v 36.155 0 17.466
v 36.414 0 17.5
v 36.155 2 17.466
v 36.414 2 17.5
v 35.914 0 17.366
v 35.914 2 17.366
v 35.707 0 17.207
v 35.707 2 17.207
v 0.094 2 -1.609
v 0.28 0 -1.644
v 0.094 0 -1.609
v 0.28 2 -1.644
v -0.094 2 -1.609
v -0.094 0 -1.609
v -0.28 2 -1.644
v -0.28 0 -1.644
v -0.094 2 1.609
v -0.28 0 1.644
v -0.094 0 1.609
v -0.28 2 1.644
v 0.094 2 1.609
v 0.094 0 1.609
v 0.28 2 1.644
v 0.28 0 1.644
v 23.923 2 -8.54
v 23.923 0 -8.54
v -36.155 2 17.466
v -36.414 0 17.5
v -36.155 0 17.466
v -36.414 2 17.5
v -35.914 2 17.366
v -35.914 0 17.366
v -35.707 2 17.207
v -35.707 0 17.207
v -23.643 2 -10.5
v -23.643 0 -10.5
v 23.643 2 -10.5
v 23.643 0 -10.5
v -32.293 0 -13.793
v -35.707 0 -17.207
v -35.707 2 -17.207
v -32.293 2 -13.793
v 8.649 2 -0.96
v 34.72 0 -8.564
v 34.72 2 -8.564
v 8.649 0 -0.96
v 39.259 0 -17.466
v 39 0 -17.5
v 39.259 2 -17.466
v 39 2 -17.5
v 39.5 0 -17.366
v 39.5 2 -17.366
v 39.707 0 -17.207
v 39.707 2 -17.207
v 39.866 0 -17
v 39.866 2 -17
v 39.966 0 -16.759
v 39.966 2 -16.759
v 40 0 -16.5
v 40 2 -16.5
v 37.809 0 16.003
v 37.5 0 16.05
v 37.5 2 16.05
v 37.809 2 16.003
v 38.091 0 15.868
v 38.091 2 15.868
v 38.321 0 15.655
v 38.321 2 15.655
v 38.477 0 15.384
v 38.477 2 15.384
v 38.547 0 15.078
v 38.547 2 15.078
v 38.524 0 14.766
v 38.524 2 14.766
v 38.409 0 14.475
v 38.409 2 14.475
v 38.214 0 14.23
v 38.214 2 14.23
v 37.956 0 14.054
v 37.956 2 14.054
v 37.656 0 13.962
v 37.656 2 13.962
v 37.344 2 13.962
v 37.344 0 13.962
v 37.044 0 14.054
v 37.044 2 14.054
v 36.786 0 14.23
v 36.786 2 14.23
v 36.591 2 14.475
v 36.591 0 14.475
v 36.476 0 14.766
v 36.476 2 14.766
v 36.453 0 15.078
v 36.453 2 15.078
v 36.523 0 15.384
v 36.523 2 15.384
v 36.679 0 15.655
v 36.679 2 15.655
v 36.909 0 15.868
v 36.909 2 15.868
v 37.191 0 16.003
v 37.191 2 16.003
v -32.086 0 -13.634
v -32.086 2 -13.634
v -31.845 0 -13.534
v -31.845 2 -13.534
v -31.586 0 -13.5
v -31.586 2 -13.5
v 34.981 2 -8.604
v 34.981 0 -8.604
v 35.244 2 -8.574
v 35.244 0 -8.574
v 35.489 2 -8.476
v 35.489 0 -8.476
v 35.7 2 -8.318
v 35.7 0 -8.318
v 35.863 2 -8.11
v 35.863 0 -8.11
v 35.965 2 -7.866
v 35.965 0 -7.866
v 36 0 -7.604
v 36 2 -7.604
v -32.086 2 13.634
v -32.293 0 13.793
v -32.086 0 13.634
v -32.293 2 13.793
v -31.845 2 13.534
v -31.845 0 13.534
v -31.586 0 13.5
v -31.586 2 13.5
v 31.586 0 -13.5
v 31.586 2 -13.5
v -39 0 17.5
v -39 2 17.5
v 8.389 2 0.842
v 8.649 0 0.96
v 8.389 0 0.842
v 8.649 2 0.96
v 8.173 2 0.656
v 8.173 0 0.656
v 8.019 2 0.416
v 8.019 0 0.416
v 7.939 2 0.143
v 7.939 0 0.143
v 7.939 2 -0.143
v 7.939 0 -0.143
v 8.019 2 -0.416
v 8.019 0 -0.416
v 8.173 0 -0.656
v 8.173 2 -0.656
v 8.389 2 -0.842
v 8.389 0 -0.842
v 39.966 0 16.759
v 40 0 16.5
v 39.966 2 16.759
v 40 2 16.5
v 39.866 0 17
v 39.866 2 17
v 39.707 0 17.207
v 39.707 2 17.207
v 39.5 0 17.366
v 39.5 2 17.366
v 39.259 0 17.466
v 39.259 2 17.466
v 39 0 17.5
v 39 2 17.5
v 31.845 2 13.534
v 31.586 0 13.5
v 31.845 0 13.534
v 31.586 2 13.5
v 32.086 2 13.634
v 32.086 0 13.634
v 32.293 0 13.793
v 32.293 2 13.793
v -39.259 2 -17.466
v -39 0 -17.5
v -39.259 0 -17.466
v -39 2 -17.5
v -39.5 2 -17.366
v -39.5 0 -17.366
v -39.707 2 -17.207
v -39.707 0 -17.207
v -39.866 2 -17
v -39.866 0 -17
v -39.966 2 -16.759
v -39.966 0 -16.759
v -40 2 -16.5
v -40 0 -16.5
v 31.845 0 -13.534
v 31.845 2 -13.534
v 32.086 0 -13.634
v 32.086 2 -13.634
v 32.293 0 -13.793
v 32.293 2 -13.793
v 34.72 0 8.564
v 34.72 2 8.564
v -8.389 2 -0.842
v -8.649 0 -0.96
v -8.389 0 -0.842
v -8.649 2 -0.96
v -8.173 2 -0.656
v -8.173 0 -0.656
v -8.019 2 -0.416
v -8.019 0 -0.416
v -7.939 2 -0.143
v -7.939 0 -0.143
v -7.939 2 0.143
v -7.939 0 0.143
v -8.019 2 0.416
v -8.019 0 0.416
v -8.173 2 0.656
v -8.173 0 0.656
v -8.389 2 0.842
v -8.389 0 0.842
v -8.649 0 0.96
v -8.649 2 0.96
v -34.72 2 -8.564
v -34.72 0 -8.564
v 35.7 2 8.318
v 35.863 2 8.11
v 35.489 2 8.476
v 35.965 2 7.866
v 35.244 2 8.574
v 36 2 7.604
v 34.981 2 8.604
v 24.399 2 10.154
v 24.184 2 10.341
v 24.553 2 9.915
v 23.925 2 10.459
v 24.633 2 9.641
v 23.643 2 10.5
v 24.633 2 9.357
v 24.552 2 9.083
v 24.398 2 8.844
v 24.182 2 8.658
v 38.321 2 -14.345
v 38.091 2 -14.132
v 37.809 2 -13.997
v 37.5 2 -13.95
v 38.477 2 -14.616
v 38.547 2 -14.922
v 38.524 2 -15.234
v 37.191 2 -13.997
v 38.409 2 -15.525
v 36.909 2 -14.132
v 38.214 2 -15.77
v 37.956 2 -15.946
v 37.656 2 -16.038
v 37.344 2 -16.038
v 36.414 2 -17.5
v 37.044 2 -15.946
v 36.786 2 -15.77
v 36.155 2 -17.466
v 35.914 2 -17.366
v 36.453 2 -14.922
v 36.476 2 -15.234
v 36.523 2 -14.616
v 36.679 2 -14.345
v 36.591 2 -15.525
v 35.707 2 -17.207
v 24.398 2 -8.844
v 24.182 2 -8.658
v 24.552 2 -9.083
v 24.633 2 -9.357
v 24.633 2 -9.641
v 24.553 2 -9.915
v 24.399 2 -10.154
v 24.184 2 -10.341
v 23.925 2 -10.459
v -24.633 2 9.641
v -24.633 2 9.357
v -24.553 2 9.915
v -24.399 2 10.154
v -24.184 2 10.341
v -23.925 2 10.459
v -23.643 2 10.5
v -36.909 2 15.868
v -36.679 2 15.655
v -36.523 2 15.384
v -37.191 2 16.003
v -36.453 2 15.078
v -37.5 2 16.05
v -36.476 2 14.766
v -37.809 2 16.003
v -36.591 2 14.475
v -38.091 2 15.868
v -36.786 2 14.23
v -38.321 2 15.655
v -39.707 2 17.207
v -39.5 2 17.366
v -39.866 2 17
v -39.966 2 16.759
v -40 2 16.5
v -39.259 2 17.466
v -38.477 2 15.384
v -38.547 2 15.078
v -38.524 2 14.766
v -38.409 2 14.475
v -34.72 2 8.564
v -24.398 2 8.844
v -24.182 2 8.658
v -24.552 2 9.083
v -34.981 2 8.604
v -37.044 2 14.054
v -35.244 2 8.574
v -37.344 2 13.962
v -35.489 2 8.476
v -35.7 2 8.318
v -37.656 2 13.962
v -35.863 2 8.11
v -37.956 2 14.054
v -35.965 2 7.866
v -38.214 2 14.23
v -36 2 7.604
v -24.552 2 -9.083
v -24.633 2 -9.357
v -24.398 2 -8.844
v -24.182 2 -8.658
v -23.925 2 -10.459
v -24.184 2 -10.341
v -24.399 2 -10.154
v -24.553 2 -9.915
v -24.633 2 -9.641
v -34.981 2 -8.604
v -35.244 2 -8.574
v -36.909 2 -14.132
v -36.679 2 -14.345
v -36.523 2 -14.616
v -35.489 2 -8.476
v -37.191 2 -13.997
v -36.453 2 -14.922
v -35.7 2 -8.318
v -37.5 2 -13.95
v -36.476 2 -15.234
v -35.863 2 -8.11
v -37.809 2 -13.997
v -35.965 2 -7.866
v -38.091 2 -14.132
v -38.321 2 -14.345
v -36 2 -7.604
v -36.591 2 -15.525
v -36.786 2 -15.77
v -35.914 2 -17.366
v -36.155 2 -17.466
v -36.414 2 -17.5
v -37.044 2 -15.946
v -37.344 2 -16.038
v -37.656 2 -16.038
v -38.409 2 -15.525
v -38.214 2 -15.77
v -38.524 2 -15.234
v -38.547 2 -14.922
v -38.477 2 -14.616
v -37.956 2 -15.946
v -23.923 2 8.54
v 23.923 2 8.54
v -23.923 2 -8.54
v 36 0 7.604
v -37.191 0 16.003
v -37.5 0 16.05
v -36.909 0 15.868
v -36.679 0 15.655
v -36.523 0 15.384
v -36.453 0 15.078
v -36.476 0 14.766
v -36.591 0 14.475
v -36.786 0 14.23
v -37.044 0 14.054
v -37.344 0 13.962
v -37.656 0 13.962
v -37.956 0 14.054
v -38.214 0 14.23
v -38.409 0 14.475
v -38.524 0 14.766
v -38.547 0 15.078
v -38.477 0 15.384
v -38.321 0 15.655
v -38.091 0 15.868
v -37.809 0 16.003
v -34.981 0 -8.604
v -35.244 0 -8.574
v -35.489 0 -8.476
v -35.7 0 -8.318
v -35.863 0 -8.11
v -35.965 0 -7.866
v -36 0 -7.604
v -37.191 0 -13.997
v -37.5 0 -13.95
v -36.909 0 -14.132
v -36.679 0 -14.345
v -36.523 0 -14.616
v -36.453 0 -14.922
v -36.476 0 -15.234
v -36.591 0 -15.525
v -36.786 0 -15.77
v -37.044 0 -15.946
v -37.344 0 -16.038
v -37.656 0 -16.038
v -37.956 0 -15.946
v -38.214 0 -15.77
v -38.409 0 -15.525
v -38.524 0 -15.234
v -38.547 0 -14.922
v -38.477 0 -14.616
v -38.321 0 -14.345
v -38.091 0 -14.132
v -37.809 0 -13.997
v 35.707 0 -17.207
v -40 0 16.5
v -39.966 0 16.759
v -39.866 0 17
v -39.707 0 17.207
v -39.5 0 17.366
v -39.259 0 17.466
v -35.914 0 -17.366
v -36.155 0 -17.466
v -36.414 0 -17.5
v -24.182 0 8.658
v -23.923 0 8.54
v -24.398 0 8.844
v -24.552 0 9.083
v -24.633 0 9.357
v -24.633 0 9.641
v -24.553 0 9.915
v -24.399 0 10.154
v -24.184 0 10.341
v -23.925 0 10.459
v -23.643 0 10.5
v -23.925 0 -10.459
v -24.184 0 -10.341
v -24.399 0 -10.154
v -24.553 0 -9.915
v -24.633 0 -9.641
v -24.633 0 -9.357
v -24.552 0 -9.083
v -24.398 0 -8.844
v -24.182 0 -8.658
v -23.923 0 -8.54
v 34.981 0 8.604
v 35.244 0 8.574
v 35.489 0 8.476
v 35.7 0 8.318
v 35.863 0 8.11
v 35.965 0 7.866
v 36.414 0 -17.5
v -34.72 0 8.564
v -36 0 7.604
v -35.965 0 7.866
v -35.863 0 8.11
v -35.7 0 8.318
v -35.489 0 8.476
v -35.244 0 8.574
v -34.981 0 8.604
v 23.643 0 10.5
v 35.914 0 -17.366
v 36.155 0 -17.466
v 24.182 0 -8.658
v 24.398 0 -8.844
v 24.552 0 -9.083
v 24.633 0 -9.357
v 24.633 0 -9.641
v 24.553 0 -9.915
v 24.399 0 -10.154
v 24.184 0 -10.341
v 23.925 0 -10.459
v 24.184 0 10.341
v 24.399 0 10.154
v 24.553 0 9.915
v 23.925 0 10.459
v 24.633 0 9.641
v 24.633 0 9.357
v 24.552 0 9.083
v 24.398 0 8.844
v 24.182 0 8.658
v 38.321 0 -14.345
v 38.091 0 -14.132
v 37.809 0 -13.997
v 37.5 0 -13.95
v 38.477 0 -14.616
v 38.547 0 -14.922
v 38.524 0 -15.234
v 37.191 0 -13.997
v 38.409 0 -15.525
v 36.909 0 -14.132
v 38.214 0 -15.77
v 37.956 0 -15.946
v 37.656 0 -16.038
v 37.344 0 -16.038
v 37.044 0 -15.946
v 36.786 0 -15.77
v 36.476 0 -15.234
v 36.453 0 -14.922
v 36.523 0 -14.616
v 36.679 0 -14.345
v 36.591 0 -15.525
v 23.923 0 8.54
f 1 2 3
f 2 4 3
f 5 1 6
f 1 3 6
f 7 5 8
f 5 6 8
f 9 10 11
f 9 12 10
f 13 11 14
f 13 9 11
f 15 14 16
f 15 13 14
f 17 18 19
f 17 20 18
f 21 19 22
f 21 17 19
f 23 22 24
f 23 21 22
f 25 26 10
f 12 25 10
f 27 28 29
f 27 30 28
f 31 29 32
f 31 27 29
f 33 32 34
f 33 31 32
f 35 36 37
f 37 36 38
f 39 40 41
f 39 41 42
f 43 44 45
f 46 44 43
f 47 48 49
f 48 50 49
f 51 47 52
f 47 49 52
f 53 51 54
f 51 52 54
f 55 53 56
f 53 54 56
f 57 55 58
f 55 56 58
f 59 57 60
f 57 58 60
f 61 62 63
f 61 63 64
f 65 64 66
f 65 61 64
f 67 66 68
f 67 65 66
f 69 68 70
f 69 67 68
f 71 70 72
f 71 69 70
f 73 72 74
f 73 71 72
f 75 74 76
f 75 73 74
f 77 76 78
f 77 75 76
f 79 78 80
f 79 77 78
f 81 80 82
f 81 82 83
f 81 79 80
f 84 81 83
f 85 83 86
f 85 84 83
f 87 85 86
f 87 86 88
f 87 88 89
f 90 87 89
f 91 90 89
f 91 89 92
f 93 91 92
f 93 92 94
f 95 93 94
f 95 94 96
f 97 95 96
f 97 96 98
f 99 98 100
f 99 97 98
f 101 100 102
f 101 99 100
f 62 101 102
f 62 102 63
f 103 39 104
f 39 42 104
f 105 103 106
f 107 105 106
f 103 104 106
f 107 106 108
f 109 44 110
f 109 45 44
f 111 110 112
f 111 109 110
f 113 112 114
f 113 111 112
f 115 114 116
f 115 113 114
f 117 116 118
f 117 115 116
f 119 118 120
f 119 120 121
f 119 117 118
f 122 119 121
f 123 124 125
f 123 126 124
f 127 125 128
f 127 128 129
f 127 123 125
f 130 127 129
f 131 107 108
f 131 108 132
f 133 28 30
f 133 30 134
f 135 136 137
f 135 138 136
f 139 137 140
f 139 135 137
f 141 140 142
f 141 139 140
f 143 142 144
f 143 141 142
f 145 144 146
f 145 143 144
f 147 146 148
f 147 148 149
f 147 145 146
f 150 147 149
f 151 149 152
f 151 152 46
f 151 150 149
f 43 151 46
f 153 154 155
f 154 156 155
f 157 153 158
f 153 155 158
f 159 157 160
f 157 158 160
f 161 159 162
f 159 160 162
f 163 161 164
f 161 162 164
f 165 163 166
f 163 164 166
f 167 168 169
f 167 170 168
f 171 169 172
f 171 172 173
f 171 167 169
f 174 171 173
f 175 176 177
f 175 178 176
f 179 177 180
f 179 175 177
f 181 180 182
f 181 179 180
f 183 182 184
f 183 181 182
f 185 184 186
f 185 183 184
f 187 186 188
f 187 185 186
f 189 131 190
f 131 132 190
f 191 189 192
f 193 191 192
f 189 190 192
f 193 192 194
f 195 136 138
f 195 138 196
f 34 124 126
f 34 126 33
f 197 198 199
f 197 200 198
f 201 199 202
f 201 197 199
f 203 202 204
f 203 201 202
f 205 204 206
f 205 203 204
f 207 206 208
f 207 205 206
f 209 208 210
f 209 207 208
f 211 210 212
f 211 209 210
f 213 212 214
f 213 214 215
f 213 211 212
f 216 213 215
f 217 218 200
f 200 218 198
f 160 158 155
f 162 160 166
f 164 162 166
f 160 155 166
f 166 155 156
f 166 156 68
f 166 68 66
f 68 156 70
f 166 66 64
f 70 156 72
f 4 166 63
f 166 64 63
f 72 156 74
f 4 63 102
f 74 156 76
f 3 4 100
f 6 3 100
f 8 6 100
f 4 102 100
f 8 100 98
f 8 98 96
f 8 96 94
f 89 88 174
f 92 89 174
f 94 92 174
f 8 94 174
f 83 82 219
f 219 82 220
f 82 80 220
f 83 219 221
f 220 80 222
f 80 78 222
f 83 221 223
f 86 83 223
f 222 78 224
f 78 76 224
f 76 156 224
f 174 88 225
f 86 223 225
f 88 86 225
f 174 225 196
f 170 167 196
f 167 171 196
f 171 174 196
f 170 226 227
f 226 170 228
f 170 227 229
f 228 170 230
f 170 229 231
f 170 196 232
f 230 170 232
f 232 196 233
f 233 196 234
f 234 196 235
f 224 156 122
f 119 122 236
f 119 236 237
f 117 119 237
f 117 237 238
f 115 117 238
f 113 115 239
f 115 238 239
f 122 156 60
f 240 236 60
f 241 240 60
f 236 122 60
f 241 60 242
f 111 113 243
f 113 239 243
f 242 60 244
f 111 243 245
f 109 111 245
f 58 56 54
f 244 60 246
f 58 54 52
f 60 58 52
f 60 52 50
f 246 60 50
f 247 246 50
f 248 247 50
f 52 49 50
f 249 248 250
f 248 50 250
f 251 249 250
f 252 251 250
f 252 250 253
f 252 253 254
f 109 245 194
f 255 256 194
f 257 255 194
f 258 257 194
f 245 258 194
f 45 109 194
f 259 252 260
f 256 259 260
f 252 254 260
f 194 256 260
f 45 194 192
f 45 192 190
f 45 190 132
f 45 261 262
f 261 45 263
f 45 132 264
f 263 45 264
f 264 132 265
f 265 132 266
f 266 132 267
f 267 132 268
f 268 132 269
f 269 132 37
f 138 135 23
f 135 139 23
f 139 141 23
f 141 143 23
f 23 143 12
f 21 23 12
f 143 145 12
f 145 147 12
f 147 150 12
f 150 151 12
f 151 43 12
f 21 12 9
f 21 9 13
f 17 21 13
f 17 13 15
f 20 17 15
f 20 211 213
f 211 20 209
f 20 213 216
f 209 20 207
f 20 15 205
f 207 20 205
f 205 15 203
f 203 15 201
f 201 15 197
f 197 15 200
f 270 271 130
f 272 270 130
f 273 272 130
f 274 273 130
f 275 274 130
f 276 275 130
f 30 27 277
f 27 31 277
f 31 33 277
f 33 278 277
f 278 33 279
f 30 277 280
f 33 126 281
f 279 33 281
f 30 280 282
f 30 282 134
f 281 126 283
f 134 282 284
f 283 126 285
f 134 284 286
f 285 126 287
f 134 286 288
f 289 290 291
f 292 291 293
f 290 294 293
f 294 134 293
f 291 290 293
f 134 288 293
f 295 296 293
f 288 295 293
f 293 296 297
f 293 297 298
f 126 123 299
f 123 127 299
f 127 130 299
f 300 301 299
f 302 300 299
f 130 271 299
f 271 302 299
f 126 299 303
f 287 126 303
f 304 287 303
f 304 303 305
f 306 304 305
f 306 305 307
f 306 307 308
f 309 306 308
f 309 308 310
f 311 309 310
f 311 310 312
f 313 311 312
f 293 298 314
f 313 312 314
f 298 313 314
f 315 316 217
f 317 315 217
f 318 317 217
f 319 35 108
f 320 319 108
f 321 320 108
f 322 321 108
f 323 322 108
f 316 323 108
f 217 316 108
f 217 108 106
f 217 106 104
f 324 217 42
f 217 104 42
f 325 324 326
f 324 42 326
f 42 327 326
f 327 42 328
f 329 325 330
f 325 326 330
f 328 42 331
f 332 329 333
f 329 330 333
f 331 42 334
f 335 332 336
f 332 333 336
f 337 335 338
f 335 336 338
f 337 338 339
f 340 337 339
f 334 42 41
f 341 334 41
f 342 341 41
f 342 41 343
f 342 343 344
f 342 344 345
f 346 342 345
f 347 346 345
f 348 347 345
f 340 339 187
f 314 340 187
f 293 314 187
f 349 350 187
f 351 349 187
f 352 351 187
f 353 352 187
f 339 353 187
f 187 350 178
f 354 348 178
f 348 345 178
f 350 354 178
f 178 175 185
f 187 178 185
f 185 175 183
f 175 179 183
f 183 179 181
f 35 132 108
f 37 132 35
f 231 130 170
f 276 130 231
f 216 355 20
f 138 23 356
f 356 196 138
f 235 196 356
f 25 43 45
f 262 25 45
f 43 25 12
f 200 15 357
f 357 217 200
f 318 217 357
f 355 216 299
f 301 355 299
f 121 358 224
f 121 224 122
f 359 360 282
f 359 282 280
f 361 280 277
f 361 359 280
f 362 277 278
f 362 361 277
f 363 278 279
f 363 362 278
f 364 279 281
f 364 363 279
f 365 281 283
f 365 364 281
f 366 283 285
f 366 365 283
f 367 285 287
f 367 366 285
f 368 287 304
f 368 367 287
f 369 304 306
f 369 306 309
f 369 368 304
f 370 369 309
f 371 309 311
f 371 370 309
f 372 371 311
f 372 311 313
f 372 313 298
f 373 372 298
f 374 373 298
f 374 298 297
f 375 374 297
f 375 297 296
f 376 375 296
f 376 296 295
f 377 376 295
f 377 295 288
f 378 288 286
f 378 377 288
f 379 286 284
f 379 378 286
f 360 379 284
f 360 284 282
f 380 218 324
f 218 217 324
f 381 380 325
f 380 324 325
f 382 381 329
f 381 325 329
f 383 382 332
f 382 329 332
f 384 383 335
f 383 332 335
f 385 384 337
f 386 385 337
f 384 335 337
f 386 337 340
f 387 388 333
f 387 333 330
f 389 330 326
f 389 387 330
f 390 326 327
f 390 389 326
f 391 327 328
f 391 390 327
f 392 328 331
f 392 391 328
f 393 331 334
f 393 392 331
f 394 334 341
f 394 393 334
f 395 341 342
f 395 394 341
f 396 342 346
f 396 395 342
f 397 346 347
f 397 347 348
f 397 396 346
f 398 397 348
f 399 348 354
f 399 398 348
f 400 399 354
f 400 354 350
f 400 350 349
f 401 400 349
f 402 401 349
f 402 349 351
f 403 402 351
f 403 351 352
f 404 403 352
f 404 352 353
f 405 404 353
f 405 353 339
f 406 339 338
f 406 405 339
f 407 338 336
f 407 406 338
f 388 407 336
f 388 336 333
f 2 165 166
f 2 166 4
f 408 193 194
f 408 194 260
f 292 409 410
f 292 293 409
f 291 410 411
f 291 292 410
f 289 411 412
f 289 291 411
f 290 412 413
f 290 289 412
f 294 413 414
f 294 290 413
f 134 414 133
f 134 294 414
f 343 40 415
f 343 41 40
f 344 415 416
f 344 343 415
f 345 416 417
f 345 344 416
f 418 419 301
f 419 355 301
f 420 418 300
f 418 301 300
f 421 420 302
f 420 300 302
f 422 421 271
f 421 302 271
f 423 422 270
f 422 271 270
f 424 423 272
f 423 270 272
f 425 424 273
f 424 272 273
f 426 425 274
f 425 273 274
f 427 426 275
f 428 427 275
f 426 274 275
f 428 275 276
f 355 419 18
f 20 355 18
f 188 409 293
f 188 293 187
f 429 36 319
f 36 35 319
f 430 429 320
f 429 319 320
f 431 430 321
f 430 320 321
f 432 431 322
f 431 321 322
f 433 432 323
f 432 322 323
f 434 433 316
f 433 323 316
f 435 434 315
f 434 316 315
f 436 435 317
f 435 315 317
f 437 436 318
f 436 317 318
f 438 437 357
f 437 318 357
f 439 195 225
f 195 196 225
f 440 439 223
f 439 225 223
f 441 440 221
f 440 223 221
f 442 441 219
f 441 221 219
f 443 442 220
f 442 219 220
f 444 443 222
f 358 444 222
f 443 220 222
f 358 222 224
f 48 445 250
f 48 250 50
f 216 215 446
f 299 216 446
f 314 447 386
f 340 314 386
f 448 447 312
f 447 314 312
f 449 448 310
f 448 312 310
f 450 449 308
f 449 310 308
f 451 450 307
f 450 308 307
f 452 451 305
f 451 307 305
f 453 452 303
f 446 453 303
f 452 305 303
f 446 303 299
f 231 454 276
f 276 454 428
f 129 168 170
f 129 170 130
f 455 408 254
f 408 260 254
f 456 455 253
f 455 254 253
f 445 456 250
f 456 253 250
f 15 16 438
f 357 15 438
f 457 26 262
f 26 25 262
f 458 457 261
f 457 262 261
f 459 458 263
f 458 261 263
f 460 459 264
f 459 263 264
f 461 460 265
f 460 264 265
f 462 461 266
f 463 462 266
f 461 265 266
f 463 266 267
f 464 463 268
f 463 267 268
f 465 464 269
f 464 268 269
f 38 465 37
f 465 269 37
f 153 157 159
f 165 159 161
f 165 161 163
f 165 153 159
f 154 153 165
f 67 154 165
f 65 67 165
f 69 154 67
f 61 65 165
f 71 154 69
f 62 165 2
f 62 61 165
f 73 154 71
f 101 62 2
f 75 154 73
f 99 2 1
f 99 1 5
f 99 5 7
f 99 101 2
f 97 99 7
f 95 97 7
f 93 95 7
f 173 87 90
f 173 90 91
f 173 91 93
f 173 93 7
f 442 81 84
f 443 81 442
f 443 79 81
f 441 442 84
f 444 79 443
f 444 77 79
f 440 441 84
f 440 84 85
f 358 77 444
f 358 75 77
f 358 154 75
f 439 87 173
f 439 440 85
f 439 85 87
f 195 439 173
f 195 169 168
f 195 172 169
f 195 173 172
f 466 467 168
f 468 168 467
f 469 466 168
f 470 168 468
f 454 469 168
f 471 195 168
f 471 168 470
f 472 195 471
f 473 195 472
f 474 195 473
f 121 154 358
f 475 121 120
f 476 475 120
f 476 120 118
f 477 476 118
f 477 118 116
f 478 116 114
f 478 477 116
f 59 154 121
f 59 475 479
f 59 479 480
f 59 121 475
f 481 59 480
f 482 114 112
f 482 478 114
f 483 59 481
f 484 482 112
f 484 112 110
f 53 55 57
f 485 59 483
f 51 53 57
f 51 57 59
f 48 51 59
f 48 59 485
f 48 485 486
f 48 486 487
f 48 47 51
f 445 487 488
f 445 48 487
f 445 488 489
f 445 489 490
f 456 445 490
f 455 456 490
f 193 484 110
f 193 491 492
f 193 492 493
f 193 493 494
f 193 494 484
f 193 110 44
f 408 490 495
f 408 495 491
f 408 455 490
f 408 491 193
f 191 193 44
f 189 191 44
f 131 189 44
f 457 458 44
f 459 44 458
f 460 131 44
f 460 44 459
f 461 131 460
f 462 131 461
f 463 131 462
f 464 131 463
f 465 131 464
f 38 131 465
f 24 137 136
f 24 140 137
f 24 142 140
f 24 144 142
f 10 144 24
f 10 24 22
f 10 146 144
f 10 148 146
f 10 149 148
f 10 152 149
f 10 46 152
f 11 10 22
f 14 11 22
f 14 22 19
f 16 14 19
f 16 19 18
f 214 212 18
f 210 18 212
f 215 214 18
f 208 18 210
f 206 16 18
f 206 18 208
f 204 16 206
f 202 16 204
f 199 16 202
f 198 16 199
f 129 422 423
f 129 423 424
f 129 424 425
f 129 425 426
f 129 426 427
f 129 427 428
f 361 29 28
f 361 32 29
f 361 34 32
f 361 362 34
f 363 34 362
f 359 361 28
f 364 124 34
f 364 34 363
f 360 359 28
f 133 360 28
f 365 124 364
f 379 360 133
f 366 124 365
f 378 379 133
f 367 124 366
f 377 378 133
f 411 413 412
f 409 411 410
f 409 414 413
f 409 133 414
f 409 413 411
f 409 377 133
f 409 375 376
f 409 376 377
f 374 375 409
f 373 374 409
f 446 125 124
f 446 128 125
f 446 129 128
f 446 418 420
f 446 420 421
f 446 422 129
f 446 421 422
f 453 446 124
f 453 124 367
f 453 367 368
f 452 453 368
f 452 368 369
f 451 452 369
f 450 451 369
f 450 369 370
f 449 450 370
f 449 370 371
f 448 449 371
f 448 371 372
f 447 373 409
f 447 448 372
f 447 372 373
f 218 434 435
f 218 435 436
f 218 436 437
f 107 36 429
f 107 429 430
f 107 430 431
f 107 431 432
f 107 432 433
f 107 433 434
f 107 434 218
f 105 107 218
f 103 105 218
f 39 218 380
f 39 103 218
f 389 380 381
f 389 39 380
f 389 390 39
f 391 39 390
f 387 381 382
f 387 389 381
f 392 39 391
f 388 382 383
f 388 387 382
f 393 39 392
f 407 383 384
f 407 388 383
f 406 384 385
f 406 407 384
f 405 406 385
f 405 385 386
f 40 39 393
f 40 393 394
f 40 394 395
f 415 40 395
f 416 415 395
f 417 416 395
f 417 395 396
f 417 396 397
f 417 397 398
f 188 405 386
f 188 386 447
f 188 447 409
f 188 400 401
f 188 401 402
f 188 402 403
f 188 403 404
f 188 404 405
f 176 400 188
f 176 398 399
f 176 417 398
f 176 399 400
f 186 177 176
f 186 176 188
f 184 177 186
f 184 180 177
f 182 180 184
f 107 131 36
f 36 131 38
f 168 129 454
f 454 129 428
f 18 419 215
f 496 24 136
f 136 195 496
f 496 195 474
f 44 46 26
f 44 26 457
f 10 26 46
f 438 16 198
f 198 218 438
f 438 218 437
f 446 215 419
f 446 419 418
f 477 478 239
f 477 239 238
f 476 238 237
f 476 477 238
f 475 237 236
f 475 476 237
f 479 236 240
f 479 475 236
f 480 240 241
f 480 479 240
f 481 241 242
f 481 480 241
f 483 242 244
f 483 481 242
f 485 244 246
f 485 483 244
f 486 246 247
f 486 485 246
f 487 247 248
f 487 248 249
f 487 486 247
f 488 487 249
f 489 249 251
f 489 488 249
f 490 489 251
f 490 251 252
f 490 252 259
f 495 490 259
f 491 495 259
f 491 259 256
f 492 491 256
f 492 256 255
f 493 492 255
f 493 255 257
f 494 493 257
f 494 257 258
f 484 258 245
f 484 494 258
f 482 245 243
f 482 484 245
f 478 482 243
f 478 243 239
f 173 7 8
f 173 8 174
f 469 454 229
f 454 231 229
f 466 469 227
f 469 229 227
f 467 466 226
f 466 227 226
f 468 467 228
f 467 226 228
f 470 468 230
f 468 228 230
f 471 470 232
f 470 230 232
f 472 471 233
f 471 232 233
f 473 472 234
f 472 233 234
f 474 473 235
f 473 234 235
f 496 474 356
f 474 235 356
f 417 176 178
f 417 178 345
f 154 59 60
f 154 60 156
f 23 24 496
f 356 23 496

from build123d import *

# Parameters (mm, degrees)
SKETCH_2_R      = 1.05
EXTRUDE_1_DEPTH = 2
FILLET_1_R      = 1


with BuildPart() as part:
    # 草图2 → 凸台-拉伸1 (new body)
    with BuildSketch(Plane(origin=(0, 0, 0), x_dir=(1, 0, 0), z_dir=(0, 1, 0))):
        Polygon((-36, 17.5), (-32, 13.5), (32, 13.5), (36, 17.5), (40, 17.5), (40, -17.5), (36, -17.5), (32, -13.5), (-32, -13.5), (-36, -17.5), (-40, -17.5), (-40, 17.5), align=None)
        with Locations(Location((-37.5, 15, 0), (0, 0, 270))):
            Circle(SKETCH_2_R, mode=Mode.SUBTRACT)
        with Locations(Location((37.5, 15, 0), (0, 0, 270))):
            Circle(SKETCH_2_R, mode=Mode.SUBTRACT)
        with Locations(Location((37.5, -15, 0), (0, 0, 270))):
            Circle(SKETCH_2_R, mode=Mode.SUBTRACT)
        with Locations(Location((-37.5, -15, 0), (0, 0, 270))):
            Circle(SKETCH_2_R, mode=Mode.SUBTRACT)
        Polygon((30.642857143, 10.5), (0, 1.5625), (-30.642857143, 10.5), align=None, mode=Mode.SUBTRACT)
        Polygon((-30.642857143, -10.5), (0, -1.5625), (30.642857143, -10.5), align=None, mode=Mode.SUBTRACT)
        Polygon((-36, 8.9375), (-5.357142857, 0), (-36, -8.9375), align=None, mode=Mode.SUBTRACT)
        Polygon((36, -8.9375), (36, 8.9375), (5.357142857, 0), align=None, mode=Mode.SUBTRACT)
    extrude(amount=EXTRUDE_1_DEPTH)

    # 圆角1
    fillet_1_edges = [part.edges().sort_by_distance(p)[0] for p in [
        (-30.642857143, 1, 10.5),
        (30.642857143, 1, 10.5),
        (0, 1, 1.5625),
        (36, 1, 8.9375),
        (36, 1, -8.9375),
        (5.357142857, 1, 0),
        (-36, 1, -8.9375),
        (-36, 1, 8.9375),
        (-5.357142857, 1, 0),
        (-40, 1, 17.5),
        (-40, 1, -17.5),
        (-36, 1, -17.5),
        (-32, 1, -13.5),
        (32, 1, -13.5),
        (36, 1, -17.5),
        (40, 1, -17.5),
        (40, 1, 17.5),
        (36, 1, 17.5),
        (32, 1, 13.5),
        (-32, 1, 13.5),
        (-36, 1, 17.5),
        (-30.642857143, 1, -10.5),
        (0, 1, -1.5625),
        (30.642857143, 1, -10.5),
    ]]
    fillet(fillet_1_edges, radius=FILLET_1_R)


solid = part.part
